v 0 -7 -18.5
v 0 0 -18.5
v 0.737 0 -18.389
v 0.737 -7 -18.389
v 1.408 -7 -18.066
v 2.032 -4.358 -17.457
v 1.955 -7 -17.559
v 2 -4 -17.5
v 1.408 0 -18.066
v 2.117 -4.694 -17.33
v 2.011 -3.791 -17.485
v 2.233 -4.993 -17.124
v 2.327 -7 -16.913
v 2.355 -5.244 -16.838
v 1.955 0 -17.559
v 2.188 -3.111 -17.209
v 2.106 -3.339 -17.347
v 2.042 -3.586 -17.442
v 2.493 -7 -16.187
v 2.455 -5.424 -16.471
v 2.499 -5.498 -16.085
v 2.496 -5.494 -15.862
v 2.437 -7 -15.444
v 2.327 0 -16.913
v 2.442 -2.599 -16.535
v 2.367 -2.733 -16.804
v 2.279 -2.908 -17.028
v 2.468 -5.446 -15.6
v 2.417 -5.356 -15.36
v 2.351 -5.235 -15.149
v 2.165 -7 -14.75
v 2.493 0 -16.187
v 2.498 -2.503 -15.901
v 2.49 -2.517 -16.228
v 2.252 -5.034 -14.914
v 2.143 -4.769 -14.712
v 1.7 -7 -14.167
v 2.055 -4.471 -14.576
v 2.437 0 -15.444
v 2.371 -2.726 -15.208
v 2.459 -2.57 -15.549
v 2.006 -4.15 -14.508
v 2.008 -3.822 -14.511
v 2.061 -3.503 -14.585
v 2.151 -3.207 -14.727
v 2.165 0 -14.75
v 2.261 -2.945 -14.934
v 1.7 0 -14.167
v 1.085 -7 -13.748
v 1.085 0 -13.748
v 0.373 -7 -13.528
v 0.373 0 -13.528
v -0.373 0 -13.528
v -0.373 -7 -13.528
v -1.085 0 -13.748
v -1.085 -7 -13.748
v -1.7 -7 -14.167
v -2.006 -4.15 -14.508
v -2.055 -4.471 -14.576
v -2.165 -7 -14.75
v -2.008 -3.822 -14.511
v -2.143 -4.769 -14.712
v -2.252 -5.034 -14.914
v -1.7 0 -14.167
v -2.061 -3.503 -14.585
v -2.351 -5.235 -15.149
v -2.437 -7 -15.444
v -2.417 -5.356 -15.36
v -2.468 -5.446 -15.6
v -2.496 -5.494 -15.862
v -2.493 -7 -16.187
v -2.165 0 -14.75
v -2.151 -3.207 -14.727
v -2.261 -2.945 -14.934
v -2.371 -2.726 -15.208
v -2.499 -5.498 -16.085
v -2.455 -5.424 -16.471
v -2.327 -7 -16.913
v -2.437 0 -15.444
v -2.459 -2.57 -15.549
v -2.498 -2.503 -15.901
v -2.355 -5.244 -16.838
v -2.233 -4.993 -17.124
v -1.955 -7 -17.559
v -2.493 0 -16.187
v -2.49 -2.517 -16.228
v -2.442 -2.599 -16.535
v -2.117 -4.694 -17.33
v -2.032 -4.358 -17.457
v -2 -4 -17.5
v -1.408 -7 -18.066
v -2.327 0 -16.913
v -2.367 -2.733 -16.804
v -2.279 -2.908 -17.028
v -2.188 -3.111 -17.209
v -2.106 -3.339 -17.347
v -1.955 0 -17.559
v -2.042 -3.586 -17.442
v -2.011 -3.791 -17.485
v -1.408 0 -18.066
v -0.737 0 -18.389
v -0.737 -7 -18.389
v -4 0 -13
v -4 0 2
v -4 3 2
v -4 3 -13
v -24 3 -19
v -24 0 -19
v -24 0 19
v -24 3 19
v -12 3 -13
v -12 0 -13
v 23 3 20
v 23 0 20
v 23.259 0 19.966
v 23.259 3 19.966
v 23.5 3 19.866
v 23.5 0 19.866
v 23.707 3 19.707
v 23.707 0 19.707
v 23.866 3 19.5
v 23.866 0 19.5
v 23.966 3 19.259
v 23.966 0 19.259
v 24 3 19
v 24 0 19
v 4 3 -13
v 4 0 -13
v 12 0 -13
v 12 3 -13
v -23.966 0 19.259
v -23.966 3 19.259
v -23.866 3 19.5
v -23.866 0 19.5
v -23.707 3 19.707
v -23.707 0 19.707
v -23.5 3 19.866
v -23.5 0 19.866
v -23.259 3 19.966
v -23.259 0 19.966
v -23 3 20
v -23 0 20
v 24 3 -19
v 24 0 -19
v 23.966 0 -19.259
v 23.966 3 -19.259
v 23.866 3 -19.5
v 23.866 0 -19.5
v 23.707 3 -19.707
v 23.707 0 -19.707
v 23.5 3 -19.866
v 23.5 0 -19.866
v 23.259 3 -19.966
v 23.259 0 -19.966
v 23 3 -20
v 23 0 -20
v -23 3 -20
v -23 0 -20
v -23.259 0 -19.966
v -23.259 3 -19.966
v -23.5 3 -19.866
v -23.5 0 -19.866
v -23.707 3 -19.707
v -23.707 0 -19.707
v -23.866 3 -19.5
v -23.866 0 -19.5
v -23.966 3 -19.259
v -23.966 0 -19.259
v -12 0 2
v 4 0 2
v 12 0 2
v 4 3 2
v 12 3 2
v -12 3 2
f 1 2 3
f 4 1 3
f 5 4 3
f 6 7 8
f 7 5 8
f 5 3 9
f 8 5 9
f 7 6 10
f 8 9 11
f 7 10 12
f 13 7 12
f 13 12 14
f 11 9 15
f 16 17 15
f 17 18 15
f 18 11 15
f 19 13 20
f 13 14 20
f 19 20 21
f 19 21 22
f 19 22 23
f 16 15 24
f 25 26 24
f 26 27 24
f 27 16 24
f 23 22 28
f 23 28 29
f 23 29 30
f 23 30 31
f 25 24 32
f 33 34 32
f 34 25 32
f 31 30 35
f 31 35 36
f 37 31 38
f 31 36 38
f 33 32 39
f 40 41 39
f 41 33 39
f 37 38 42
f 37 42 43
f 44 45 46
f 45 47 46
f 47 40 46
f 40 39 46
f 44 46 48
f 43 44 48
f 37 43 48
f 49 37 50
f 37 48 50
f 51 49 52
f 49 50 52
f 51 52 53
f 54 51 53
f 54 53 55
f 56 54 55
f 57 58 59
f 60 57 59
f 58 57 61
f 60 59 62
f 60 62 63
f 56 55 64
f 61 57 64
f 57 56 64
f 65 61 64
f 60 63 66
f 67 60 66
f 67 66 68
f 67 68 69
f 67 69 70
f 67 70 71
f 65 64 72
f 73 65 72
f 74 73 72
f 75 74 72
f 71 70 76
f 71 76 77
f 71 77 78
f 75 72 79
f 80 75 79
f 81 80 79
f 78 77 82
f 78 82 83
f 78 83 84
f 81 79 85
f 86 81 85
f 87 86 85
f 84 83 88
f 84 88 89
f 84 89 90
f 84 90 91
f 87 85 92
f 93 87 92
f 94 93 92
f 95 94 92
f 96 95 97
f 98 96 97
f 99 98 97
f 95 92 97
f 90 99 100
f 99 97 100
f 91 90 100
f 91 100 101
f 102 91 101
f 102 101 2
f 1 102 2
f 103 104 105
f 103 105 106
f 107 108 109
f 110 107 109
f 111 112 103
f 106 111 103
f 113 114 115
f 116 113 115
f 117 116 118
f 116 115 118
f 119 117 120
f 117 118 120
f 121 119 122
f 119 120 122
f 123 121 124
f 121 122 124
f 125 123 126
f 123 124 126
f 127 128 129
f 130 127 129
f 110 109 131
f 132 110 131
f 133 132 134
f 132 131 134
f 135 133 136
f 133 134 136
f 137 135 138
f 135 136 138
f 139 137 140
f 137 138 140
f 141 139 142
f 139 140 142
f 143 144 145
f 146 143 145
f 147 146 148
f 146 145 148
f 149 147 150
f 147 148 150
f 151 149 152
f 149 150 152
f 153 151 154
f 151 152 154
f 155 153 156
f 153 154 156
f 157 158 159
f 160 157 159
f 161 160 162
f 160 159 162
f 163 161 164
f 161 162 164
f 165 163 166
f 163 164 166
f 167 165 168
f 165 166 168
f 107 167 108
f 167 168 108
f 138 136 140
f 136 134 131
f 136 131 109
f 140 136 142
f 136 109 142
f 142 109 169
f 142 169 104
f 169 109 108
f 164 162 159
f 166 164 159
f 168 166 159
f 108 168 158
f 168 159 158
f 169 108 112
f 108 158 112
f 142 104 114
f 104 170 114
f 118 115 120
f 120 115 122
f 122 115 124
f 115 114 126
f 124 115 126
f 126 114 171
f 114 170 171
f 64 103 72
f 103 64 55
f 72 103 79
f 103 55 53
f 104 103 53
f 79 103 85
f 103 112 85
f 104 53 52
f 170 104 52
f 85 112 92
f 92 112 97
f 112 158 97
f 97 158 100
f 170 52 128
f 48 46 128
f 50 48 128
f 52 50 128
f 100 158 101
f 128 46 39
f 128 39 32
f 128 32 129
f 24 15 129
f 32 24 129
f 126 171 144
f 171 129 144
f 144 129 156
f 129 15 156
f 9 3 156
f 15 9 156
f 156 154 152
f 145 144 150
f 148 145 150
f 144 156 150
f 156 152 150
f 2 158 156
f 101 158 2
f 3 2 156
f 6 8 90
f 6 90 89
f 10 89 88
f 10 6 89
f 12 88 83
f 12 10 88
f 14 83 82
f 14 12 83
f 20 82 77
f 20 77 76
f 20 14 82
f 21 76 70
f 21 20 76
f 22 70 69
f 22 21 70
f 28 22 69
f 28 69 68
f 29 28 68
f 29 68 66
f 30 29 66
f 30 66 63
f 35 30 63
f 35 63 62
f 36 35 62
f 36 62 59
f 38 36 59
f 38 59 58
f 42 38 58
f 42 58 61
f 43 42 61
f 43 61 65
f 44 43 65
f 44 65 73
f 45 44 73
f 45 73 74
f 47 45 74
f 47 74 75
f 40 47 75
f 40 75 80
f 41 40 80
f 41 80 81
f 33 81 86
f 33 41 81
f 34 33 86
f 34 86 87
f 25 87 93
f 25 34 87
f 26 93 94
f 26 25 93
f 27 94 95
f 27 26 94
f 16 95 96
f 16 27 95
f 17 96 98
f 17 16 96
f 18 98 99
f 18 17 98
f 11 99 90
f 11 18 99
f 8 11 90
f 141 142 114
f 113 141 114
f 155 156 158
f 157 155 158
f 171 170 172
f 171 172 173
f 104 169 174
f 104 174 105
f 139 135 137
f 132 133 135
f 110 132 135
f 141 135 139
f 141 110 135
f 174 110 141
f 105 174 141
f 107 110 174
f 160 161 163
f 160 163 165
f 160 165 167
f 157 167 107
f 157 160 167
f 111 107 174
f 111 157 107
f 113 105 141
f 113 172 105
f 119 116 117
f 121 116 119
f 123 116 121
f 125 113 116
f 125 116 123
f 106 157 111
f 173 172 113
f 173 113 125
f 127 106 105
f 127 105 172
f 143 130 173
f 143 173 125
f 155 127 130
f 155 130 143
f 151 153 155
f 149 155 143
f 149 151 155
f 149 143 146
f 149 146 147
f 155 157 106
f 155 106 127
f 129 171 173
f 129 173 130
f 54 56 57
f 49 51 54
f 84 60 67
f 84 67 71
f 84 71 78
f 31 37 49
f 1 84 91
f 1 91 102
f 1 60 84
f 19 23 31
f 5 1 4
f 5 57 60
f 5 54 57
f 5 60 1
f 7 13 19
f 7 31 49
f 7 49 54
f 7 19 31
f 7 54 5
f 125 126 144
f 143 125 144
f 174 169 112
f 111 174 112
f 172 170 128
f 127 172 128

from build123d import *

# Parameters (mm, degrees)
SKETCH1_W               = 8
SKETCH1_H               = 15
BOSS_EXTRUDE1_DEPTH     = 3
SKETCH2_R               = 2.5
BOSS_EXTRUDE2_DEPTH     = 7
CUT_EXTRUDE1_DEPTH      = 8
CUT_EXTRUDE1_DEPTH_BACK = 10
SKETCH3_R               = 1.5


with BuildPart() as part:
    # Sketch1 → Boss-Extrude1 (new body)
    with BuildSketch(Plane(origin=(0, 0, 0), x_dir=(1, 0, 0), z_dir=(0, 1, 0))):
        with BuildLine():
            Line((-23, -20), (23, -20))
            ThreePointArc((23, -20), (23.707106781, -19.707106781), (24, -19))
            Line((24, -19), (24, 19))
            ThreePointArc((24, 19), (23.707106781, 19.707106781), (23, 20))
            Line((23, 20), (-23, 20))
            ThreePointArc((-23, 20), (-23.707106781, 19.707106781), (-24, 19))
            Line((-24, 19), (-24, -19))
            ThreePointArc((-24, -19), (-23.707106781, -19.707106781), (-23, -20))
        make_face()
        with Locations((-8, 5.5)):
            Rectangle(SKETCH1_W, SKETCH1_H, mode=Mode.SUBTRACT)
        with Locations((8, 5.5)):
            Rectangle(SKETCH1_W, SKETCH1_H, mode=Mode.SUBTRACT)
    extrude(amount=BOSS_EXTRUDE1_DEPTH)

    # Sketch2 → Boss-Extrude2 (add)
    with BuildSketch(Plane.XZ):
        with Locations(Location((0, -16, 0), (0, 0, 270))):
            Circle(SKETCH2_R)
    extrude(amount=BOSS_EXTRUDE2_DEPTH)

    # Sketch3 → Cut-Extrude1 (cut, two sides: drawn at the far end of the back side and taken through both)
    with BuildSketch(Plane.ZY.offset(-CUT_EXTRUDE1_DEPTH_BACK)):
        with Locations(Location((-16, -4, 0), (0, 0, 180))):
            Circle(SKETCH3_R)
    extrude(amount=CUT_EXTRUDE1_DEPTH + CUT_EXTRUDE1_DEPTH_BACK, mode=Mode.SUBTRACT)


solid = part.part
